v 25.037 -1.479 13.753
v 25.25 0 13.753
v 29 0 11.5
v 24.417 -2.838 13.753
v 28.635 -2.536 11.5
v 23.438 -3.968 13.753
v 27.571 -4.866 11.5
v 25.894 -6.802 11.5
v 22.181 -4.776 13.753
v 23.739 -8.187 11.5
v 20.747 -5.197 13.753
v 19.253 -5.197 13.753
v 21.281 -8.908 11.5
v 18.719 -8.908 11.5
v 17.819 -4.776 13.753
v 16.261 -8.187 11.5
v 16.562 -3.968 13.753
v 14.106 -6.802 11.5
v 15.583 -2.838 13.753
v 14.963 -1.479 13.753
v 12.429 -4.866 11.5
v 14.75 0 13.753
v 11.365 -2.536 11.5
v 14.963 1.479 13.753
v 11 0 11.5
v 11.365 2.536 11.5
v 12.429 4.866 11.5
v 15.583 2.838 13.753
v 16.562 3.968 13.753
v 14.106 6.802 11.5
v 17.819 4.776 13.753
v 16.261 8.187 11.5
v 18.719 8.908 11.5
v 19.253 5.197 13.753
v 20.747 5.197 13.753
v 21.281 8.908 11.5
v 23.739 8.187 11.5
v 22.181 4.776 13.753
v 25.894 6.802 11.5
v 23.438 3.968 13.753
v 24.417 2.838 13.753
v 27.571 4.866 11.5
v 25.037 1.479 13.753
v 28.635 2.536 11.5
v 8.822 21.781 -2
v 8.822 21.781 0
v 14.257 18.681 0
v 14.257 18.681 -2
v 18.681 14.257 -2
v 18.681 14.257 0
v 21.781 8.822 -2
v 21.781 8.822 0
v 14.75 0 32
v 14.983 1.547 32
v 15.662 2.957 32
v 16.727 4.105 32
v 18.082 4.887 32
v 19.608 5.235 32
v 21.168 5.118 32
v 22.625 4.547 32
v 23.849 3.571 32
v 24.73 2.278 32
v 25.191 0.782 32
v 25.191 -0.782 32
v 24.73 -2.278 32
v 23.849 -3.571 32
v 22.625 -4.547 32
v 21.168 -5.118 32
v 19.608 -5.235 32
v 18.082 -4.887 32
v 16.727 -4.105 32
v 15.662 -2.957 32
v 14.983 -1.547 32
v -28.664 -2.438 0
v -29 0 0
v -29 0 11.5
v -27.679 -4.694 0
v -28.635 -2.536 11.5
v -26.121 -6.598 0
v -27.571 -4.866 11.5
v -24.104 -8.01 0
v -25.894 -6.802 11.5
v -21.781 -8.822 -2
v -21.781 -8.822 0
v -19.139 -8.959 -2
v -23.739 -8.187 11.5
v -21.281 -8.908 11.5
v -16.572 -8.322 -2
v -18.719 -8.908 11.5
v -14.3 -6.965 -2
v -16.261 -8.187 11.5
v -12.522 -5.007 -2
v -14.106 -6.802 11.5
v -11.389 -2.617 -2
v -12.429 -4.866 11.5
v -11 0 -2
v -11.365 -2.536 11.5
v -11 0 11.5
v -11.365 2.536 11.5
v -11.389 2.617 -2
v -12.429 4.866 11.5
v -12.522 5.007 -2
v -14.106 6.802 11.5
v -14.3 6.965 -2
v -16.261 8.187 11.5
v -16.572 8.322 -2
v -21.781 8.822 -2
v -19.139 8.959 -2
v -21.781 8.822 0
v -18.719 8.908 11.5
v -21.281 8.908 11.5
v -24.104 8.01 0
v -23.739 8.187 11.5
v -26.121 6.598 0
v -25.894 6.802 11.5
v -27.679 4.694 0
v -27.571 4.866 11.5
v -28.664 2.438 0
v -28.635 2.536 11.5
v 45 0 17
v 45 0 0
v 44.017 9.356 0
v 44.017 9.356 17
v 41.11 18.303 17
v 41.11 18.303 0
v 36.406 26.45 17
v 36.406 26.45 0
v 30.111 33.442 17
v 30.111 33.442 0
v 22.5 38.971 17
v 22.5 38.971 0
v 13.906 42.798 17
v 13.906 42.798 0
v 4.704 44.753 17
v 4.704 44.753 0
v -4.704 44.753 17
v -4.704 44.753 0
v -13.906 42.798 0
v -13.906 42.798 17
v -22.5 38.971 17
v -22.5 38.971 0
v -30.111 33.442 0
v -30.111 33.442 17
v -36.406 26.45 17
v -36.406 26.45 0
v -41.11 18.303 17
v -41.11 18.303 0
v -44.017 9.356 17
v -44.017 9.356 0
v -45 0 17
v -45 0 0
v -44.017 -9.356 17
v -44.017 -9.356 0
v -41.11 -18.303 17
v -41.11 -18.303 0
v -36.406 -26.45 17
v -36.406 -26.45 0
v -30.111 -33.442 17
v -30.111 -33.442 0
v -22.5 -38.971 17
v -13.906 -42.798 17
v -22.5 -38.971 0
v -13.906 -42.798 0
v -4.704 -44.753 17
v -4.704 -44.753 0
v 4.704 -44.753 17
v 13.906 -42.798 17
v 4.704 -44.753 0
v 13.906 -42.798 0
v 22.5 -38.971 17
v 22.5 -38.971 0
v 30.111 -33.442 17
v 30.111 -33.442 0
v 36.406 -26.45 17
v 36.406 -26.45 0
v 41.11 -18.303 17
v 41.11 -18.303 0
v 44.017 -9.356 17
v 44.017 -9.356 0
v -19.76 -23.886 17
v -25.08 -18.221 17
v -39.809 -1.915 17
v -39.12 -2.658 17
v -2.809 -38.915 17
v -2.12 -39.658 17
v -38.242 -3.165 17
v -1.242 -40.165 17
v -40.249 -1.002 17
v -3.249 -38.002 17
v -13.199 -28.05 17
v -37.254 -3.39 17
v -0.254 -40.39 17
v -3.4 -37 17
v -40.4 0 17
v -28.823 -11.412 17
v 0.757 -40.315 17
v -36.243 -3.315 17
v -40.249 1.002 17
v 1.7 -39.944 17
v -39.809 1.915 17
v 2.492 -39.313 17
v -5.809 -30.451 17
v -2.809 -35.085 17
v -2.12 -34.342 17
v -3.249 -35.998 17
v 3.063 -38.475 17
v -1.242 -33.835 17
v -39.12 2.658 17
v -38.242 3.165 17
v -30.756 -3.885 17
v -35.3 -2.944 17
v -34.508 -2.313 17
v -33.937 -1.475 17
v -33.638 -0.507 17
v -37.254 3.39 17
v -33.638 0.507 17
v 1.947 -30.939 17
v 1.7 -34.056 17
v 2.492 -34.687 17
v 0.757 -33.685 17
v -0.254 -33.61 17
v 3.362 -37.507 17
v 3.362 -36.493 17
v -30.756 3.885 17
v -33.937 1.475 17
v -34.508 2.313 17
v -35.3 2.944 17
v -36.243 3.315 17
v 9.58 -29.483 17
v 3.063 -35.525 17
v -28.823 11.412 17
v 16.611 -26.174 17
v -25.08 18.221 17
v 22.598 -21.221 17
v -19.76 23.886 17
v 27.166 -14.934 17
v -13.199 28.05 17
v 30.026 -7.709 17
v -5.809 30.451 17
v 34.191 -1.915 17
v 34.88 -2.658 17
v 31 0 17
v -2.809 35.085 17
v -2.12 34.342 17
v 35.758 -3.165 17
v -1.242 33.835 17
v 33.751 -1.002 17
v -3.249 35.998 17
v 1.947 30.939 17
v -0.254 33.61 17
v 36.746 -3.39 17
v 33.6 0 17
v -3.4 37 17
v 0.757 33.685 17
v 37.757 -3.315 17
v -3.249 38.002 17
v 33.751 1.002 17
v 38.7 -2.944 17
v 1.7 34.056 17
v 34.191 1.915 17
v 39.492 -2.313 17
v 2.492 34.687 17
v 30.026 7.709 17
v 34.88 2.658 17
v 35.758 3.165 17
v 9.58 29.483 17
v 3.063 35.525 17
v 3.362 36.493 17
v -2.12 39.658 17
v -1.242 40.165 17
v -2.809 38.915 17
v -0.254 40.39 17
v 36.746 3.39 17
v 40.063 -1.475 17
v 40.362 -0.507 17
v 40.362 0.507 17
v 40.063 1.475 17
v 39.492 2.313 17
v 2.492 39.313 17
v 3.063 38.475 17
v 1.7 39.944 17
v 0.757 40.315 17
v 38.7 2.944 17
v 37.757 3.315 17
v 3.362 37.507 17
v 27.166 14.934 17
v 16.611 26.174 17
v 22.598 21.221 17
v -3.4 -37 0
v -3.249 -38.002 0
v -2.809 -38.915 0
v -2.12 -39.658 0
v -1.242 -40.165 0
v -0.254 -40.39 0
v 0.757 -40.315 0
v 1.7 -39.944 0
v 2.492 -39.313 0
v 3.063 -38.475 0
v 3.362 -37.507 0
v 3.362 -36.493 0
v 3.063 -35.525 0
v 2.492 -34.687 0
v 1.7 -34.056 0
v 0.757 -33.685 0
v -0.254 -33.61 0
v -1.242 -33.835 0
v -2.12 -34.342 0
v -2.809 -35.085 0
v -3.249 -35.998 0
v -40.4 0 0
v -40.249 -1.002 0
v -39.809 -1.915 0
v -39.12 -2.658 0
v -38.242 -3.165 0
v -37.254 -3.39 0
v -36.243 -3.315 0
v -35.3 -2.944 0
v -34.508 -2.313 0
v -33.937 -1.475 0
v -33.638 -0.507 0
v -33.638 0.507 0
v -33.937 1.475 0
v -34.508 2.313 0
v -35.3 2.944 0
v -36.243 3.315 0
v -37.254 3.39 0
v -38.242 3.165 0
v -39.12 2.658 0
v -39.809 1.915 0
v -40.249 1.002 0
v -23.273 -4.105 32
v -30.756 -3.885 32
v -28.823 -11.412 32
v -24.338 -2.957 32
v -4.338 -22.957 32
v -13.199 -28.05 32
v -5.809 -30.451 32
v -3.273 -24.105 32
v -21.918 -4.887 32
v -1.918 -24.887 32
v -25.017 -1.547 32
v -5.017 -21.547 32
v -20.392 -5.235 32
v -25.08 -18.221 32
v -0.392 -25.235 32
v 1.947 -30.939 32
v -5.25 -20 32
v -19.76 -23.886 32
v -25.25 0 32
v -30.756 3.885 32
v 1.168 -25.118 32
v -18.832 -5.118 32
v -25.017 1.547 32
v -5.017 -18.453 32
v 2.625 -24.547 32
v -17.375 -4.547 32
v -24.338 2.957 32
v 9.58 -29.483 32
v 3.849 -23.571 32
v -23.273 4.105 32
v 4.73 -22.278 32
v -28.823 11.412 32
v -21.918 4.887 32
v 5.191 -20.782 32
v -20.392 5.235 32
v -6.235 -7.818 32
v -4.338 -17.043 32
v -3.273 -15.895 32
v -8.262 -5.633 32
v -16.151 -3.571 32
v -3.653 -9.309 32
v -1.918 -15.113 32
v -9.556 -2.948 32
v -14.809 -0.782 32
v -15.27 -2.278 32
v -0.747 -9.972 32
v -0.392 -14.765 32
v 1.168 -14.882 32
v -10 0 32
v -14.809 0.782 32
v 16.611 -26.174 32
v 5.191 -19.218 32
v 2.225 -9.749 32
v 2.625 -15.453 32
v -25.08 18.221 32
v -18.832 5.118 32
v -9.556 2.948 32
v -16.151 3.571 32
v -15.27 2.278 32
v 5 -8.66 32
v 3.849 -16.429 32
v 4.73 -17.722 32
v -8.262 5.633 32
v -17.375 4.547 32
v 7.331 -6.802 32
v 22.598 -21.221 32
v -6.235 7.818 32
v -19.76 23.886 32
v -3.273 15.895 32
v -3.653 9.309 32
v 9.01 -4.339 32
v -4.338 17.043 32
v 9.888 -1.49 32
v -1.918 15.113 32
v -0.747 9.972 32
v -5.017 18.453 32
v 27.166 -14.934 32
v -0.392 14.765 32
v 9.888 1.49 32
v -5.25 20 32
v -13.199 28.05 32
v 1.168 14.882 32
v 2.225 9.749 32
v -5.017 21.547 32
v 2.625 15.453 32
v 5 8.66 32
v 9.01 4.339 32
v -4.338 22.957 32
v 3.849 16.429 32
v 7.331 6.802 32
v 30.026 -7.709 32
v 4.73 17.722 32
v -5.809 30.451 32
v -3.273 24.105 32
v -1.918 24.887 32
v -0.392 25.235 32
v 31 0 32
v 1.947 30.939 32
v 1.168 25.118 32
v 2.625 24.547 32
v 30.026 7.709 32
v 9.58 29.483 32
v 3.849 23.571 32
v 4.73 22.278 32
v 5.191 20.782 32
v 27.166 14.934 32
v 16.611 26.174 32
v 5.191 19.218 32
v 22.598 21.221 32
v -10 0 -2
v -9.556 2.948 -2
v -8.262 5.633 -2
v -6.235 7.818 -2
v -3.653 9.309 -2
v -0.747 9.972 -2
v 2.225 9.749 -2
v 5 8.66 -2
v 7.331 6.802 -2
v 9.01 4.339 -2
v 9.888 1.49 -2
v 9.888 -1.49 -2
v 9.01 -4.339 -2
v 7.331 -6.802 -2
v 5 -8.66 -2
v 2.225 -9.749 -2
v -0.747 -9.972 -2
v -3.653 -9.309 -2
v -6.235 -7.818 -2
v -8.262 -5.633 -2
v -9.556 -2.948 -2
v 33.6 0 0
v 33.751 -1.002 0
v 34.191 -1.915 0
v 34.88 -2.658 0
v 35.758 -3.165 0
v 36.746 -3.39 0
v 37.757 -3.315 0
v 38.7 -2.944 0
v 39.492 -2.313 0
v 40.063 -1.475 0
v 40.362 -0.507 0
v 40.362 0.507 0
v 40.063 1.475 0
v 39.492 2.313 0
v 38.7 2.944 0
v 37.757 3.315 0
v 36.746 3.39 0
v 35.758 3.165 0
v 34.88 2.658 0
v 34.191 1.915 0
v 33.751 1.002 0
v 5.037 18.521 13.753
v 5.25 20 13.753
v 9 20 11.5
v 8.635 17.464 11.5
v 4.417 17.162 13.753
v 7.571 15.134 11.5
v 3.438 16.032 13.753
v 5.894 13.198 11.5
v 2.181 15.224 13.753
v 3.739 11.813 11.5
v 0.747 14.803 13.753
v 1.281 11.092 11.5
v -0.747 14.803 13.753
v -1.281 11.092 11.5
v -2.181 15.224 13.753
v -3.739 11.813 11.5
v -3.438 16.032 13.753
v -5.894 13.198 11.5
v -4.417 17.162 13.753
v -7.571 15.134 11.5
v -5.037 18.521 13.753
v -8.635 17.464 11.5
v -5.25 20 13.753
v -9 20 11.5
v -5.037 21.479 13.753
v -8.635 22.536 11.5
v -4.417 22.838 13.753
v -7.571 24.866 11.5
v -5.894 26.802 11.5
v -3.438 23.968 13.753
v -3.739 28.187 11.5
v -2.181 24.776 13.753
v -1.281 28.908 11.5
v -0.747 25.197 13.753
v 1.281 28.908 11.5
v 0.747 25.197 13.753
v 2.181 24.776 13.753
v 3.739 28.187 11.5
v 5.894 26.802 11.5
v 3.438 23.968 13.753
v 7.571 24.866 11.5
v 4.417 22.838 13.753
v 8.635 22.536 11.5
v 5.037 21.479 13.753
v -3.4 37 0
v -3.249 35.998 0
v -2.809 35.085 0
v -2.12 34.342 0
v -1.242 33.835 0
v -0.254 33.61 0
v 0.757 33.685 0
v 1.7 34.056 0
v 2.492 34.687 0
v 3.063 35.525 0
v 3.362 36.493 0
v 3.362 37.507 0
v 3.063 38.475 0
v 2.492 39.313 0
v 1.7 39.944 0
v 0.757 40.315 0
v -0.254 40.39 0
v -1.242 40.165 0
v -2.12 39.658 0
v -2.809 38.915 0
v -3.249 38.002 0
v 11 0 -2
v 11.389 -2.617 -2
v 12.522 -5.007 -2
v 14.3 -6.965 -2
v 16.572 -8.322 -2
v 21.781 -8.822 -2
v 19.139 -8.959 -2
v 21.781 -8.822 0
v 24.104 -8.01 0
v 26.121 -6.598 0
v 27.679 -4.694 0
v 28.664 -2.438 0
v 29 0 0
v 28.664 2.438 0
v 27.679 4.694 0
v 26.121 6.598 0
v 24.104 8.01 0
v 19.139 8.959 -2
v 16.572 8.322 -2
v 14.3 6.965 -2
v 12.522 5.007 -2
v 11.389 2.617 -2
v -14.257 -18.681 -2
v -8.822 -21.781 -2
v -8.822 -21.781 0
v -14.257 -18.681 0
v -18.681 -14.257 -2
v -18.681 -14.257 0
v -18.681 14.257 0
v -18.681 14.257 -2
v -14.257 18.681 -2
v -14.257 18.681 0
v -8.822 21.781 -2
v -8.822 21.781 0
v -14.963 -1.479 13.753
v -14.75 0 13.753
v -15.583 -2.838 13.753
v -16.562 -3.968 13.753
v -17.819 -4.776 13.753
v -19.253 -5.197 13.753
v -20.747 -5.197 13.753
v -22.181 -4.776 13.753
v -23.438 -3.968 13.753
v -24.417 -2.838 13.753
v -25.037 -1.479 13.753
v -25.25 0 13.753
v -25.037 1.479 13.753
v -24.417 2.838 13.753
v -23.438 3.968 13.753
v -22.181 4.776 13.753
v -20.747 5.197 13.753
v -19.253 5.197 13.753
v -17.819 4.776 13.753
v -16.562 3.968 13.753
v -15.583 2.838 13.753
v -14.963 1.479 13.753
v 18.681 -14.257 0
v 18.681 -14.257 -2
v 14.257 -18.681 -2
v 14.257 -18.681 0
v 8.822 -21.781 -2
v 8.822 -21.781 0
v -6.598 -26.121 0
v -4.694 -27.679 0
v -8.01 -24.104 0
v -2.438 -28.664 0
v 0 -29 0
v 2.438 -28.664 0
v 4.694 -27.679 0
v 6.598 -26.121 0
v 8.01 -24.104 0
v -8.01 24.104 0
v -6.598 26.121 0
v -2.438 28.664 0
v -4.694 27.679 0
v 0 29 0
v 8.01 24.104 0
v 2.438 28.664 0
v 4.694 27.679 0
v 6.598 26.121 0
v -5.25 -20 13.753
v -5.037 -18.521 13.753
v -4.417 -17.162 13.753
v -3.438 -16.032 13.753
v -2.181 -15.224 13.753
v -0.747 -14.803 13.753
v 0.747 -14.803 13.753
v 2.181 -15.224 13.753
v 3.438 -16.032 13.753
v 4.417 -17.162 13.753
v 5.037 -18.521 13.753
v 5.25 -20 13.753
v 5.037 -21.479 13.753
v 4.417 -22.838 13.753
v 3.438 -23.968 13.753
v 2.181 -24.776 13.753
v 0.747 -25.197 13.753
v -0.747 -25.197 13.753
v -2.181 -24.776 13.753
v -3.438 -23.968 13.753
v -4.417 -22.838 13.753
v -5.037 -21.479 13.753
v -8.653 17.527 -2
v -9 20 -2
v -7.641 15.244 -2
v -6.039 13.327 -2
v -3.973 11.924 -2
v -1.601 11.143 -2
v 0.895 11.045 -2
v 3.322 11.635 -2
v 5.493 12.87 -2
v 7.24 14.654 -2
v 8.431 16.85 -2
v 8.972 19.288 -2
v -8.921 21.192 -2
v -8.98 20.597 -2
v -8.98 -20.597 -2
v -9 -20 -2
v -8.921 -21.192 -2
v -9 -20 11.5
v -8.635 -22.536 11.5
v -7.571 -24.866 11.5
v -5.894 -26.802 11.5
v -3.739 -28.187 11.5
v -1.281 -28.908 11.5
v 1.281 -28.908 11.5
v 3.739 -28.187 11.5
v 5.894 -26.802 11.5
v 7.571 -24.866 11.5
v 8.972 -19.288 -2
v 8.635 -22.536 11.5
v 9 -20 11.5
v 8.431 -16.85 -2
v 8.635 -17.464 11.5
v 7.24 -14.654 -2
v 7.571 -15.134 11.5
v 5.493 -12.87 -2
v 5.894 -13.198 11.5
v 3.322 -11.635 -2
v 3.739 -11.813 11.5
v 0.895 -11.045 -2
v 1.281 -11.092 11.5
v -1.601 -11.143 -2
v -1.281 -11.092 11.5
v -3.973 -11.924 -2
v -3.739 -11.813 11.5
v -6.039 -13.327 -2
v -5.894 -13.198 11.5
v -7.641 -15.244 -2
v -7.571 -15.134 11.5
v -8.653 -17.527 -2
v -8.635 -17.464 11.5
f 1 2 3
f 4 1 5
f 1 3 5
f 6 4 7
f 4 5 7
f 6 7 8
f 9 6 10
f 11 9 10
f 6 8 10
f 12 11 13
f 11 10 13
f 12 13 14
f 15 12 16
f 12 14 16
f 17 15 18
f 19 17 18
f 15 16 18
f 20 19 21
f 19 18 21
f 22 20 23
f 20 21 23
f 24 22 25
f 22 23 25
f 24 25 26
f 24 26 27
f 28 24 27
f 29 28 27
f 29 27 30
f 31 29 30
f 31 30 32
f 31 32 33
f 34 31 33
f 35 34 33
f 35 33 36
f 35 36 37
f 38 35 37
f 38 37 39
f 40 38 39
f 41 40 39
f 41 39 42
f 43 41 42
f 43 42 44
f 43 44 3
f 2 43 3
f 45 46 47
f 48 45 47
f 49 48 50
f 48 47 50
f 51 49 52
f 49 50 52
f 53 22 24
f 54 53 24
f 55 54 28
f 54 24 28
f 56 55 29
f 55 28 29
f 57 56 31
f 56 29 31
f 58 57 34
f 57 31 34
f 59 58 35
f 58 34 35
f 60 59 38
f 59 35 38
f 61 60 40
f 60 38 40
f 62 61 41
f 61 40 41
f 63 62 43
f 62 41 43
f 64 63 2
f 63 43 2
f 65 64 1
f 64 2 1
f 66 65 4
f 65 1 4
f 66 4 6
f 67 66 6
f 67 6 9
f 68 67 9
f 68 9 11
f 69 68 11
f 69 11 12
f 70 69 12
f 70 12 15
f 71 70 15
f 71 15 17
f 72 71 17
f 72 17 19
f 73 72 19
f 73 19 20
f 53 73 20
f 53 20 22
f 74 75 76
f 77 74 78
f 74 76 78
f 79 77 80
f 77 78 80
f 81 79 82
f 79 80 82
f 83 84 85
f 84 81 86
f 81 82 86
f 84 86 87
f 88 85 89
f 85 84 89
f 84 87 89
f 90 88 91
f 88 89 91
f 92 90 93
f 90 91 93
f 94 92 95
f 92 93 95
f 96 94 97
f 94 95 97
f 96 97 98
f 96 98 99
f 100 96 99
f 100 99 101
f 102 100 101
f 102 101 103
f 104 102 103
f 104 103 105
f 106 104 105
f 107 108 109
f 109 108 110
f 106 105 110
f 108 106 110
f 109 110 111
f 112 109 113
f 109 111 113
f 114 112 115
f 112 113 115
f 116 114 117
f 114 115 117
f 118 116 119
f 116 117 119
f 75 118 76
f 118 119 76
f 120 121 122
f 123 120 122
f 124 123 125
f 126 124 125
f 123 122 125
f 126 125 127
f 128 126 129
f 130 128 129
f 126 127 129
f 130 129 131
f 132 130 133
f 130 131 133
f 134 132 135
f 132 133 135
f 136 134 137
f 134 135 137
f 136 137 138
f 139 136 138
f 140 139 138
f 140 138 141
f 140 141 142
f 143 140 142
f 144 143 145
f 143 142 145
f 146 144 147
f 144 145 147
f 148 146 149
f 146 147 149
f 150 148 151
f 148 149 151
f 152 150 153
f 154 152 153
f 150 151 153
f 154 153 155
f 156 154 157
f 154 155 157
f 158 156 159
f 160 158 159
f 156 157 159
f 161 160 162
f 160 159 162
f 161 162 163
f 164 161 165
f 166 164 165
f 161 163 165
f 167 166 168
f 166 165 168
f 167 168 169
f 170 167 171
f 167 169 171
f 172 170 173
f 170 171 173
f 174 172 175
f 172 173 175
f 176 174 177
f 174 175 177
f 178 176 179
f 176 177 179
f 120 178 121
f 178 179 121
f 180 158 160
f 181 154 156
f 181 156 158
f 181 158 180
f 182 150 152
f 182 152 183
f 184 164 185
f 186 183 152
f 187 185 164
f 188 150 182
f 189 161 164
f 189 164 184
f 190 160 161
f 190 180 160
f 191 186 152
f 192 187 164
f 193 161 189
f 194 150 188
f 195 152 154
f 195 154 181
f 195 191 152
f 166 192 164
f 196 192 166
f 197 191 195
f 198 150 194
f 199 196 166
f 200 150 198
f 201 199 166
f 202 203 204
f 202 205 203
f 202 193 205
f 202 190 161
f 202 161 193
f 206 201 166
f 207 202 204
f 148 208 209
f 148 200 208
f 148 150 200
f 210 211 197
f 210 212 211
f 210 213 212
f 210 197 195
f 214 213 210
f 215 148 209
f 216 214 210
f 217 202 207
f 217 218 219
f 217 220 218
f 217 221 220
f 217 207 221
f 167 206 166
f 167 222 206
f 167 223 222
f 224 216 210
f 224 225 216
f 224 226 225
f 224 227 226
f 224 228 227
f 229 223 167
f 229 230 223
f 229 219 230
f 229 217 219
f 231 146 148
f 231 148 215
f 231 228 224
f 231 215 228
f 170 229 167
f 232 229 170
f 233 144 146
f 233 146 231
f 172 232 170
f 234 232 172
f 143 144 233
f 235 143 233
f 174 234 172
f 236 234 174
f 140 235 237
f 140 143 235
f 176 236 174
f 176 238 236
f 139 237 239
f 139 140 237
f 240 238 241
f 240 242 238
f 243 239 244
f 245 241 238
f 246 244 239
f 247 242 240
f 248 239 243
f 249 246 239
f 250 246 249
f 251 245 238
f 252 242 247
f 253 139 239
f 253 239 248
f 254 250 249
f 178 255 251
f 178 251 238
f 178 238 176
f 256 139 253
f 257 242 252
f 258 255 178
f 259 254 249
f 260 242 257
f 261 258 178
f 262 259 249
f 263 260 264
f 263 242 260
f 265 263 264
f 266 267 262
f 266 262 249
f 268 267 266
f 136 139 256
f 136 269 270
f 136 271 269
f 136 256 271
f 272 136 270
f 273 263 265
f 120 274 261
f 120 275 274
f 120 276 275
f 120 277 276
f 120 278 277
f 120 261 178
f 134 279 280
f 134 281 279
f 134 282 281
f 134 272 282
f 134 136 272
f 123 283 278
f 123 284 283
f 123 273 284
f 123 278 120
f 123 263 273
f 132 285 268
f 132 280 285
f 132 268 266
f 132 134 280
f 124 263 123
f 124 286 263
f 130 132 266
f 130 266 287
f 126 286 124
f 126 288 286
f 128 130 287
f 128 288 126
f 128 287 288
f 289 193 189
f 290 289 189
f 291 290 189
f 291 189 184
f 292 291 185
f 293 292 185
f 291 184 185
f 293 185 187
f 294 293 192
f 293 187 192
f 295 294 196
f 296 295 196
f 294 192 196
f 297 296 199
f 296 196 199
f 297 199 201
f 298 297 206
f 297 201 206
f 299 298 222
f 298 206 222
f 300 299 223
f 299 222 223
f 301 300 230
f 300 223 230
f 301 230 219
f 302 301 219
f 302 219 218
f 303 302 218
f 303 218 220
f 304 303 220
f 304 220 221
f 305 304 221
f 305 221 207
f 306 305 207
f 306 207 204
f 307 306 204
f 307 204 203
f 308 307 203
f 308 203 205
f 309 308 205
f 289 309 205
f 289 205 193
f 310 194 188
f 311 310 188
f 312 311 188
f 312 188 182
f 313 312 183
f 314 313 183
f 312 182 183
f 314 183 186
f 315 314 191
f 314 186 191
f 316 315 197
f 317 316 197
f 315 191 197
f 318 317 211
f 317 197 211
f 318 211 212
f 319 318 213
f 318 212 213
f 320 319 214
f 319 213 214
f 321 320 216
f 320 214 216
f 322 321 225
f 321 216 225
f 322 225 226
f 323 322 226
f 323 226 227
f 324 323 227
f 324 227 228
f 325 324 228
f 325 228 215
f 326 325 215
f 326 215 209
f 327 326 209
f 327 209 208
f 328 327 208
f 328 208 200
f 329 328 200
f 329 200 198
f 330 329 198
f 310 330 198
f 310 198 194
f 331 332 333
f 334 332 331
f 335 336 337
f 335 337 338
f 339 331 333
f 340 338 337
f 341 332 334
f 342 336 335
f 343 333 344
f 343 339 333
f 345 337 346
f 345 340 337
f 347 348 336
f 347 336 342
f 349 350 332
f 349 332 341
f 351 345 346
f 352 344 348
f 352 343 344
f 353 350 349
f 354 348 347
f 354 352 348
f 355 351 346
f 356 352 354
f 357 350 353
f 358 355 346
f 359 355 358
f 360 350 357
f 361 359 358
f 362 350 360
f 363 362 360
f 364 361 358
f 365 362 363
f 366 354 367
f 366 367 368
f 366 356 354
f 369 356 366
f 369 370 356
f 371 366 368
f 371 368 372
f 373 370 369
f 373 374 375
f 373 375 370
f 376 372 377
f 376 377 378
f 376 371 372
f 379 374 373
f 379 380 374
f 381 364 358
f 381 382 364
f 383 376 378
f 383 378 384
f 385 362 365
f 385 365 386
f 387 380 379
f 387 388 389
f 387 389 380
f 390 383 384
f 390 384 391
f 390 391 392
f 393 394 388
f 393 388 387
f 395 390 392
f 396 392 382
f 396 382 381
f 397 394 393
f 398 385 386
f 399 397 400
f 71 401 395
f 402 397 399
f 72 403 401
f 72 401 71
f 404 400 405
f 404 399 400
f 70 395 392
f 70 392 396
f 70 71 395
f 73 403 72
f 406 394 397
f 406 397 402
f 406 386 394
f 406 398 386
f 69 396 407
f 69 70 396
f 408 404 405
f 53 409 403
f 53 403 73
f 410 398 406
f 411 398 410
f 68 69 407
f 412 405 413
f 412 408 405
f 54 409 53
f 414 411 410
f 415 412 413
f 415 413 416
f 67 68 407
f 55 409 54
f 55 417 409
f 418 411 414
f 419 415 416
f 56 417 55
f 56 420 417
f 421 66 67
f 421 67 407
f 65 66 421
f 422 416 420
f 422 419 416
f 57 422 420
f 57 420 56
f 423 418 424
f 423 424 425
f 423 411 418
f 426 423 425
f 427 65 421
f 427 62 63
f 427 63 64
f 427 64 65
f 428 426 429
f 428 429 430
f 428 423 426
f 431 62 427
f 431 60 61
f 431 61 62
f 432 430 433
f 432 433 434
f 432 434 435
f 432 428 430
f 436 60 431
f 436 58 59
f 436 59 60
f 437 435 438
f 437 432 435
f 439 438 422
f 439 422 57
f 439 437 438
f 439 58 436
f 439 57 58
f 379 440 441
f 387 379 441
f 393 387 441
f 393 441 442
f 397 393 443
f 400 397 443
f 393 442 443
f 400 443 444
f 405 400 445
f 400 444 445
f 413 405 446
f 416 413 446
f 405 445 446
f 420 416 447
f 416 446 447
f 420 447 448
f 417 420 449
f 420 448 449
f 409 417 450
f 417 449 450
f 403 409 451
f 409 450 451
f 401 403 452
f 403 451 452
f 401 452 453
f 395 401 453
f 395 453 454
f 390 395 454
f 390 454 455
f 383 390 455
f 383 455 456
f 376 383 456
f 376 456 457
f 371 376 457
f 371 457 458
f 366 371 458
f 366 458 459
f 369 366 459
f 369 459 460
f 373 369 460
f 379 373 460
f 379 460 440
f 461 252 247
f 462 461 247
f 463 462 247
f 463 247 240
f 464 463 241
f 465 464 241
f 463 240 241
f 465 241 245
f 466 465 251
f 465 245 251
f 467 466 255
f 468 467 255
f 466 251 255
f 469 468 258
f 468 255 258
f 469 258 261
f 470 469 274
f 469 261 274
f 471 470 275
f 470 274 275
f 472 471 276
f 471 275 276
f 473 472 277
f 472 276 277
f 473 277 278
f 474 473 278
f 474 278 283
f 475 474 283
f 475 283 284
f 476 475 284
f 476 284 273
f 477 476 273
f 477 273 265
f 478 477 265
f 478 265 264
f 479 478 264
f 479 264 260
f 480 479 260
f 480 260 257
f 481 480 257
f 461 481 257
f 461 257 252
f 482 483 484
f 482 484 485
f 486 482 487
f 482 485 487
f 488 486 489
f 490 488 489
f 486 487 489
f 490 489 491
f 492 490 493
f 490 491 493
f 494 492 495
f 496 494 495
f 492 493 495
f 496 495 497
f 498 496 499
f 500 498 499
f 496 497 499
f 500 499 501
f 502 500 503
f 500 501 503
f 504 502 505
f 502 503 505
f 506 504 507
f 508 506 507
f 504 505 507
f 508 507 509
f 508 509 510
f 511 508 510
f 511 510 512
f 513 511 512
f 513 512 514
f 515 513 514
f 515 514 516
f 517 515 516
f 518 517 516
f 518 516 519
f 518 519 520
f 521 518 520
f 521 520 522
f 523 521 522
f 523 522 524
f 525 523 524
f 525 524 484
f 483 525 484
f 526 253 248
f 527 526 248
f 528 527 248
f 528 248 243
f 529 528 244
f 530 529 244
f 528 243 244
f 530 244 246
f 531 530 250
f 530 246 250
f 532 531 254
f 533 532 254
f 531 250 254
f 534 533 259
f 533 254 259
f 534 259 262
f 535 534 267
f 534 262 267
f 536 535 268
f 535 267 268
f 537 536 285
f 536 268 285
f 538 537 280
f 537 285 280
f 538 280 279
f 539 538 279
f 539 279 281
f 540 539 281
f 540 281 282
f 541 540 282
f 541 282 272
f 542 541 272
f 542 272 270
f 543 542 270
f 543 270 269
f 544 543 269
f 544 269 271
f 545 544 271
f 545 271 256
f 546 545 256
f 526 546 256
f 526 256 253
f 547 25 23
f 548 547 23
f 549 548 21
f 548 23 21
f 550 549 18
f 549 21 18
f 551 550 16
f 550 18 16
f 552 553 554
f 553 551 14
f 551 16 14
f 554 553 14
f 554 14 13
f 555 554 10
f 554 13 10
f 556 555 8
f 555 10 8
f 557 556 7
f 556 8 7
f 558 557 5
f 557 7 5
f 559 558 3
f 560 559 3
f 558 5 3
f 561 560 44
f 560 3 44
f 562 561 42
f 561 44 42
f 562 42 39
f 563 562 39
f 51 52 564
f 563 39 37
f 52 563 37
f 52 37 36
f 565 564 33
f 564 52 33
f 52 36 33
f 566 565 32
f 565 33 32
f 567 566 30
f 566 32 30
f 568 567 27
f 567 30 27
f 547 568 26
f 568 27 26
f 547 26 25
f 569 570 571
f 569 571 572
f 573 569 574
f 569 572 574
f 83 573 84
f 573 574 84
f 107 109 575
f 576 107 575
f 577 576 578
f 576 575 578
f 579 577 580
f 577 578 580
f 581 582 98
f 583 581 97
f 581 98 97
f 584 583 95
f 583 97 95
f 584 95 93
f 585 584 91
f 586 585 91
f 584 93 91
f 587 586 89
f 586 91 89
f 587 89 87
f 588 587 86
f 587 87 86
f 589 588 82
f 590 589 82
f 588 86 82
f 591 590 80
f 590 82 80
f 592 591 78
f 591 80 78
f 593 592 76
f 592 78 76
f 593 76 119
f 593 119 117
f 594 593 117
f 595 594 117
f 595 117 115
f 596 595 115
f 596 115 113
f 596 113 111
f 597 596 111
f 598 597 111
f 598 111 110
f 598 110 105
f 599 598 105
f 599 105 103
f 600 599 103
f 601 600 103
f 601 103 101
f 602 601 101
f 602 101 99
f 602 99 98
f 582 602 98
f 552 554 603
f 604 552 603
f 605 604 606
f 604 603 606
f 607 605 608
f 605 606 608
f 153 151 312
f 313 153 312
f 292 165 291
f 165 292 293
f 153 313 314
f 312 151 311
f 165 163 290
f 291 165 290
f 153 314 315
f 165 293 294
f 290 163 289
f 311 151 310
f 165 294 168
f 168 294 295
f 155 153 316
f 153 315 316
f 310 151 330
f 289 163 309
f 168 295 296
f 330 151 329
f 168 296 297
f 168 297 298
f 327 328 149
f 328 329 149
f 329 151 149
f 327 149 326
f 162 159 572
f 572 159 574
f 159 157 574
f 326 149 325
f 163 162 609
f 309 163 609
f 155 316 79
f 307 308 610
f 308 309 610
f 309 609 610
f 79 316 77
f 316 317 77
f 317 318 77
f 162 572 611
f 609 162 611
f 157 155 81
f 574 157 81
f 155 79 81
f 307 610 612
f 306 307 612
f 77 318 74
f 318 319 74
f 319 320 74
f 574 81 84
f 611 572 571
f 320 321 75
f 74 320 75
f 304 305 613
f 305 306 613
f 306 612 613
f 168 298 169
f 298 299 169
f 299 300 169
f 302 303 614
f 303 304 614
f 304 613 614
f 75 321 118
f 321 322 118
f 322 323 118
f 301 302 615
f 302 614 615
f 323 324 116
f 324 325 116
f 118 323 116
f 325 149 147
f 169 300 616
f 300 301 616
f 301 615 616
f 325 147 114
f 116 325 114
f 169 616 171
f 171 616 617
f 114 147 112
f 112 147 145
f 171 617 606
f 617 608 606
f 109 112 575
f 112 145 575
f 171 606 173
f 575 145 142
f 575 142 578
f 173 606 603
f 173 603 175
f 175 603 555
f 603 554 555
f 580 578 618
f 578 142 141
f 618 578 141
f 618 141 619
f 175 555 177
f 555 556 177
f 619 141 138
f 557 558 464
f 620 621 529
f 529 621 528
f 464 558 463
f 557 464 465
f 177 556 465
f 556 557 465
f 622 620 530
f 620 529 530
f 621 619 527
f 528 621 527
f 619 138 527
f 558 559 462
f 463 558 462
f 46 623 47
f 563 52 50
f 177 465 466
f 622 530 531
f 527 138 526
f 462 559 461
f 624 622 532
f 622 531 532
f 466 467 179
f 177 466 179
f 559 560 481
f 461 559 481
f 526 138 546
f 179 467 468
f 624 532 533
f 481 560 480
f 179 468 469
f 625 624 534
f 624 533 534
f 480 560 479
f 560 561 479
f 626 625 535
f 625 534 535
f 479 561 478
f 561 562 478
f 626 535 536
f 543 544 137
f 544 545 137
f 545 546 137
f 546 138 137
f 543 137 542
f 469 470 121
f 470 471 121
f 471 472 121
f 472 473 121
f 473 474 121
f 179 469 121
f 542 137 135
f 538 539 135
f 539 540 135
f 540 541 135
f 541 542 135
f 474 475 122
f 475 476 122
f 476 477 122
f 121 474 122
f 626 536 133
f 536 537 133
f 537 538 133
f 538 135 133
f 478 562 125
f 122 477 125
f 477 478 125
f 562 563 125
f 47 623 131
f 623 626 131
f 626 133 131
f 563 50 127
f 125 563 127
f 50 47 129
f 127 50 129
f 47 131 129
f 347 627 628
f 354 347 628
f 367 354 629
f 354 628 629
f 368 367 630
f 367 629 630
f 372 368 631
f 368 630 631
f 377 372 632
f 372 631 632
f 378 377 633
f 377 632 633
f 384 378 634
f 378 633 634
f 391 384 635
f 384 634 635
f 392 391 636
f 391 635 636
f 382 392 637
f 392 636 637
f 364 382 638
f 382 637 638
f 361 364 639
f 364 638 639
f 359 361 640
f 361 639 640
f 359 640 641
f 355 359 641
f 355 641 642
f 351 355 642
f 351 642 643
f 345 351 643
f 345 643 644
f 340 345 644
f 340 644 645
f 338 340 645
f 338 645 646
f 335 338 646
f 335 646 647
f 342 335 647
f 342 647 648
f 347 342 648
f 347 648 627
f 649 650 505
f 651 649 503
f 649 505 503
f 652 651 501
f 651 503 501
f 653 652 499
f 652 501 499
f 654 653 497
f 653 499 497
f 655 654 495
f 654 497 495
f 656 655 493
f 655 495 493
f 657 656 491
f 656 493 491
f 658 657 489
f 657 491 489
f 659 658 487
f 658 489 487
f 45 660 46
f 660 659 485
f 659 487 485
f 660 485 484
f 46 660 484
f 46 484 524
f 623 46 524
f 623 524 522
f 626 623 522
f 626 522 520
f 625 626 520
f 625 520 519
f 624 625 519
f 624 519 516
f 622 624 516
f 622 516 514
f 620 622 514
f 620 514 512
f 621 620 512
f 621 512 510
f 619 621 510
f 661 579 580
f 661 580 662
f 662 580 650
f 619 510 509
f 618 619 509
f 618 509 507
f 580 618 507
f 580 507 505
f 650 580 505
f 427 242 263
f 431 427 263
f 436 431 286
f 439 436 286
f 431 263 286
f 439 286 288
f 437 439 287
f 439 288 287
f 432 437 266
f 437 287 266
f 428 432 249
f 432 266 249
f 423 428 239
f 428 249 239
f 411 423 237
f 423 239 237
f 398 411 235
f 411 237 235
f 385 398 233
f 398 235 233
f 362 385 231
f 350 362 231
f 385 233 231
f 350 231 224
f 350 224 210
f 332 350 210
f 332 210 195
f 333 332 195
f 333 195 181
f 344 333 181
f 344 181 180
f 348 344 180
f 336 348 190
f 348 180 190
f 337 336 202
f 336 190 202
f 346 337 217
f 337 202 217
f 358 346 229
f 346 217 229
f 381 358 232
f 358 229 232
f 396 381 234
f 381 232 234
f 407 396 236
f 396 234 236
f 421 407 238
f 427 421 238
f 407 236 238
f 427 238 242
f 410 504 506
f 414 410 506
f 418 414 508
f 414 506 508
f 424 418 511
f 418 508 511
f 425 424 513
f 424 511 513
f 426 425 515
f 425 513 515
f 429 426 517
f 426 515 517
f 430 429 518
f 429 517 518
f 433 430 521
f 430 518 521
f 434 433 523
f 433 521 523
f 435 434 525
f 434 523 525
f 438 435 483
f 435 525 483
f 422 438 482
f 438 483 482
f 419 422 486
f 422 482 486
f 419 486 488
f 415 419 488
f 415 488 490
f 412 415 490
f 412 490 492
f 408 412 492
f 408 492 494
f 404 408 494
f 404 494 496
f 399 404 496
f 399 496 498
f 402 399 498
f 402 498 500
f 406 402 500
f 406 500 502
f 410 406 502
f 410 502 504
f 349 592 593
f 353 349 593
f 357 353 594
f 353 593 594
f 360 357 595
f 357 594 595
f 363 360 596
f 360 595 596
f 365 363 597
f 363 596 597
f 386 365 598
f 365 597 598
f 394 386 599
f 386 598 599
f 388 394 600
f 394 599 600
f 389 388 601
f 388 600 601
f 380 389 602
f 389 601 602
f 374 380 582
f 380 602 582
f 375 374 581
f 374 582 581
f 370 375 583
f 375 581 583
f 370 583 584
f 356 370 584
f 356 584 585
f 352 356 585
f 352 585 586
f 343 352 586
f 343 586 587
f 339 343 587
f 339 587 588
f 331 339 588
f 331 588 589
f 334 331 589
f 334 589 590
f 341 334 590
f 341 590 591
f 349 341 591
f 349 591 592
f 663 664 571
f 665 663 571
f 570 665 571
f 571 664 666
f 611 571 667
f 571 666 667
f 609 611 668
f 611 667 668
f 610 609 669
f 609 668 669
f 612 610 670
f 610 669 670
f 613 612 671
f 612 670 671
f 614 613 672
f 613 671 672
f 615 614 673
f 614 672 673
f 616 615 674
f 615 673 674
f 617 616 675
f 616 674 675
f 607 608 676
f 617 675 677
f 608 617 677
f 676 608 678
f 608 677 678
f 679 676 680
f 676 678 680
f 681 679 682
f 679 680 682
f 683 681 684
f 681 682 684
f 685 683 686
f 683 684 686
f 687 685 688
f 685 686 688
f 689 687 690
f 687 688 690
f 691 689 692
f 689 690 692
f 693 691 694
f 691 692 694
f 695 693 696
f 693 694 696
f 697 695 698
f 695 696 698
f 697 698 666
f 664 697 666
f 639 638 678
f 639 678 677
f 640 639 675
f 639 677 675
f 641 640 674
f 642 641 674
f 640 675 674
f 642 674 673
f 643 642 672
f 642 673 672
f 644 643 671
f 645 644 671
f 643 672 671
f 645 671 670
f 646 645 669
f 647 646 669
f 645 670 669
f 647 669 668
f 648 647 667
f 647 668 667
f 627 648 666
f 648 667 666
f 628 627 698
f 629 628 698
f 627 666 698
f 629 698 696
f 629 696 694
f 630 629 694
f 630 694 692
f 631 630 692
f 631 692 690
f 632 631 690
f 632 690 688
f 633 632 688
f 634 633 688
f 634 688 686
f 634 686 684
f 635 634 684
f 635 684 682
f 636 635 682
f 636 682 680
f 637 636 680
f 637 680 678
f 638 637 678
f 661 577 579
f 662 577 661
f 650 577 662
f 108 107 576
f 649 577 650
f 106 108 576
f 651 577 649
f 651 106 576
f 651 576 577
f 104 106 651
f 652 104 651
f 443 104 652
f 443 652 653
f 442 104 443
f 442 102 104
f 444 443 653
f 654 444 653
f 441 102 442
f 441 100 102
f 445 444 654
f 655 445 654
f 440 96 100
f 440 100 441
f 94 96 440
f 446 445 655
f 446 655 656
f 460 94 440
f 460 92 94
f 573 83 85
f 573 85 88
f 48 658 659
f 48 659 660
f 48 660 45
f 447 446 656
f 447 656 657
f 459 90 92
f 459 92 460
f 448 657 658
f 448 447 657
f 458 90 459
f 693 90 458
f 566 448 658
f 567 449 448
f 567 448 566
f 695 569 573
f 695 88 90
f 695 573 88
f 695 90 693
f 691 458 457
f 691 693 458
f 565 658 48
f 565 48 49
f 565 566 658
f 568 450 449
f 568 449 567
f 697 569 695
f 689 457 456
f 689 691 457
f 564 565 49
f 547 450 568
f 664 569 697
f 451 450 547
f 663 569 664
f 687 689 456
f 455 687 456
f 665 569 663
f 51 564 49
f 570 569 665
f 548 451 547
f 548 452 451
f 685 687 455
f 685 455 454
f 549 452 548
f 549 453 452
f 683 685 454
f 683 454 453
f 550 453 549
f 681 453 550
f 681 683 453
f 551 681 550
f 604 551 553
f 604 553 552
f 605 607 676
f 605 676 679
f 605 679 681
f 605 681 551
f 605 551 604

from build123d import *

# Parameters (mm, degrees)
F0_R     = 45
F1_DEPTH = 17
F2_R     = 31
F3_DEPTH = 15
F6_R     = 23.5
F7_DEPTH = 2
F9_D     = 18
F9_DEPTH = 13.5
F9_TIP   = 5.4077455712
F10_D    = 20
F11_D    = 10.5
F13_D    = 6.8


with BuildPart() as f1:
    # F0 (on Top) → F1 (new body)
    with BuildSketch(Plane.XY):
        Circle(F0_R)
    extrude(amount=F1_DEPTH)

    # F2 (on face) → F3 (join)
    with BuildSketch(Plane.XY.offset(17)):
        Circle(F2_R)
    extrude(amount=F3_DEPTH)

    # F6 (on face) → F7 (join)
    with BuildSketch(Plane(origin=(0, 0, 0), x_dir=(1, 0, 0), z_dir=(0, 0, -1))):
        Circle(F6_R)
    extrude(amount=F7_DEPTH)

    # F9
    with Locations(Plane(origin=(0, 0, -2), x_dir=(1, 0, 0), z_dir=(0, 0, -1))):
        with Locations((-20, 0), (0, 20), (20, 0), (0, -20)):
            Hole(F9_D / 2, depth=F9_DEPTH)
            with Locations((0, 0, -(F9_DEPTH + F9_TIP / 2))):  # 118° drill point
                Cone(0, F9_D / 2, F9_TIP, mode=Mode.SUBTRACT)

    # F10 (through all)
    with Locations(Plane.XY.offset(32)):
        with Locations((0, 0)):
            Hole(F10_D / 2)

    # F11 (through all)
    with Locations(Plane.XY.offset(32)):
        with Locations((-20, 0), (0, 20), (20, 0), (0, -20)):
            Hole(F11_D / 2)

    # F13 (through all)
    with Locations(Plane(origin=(0, 0, 0), x_dir=(1, 0, 0), z_dir=(0, 0, -1))):
        with Locations((0, 37), (-37, 0), (0, -37), (37, 0)):
            Hole(F13_D / 2)


solid = f1.part
